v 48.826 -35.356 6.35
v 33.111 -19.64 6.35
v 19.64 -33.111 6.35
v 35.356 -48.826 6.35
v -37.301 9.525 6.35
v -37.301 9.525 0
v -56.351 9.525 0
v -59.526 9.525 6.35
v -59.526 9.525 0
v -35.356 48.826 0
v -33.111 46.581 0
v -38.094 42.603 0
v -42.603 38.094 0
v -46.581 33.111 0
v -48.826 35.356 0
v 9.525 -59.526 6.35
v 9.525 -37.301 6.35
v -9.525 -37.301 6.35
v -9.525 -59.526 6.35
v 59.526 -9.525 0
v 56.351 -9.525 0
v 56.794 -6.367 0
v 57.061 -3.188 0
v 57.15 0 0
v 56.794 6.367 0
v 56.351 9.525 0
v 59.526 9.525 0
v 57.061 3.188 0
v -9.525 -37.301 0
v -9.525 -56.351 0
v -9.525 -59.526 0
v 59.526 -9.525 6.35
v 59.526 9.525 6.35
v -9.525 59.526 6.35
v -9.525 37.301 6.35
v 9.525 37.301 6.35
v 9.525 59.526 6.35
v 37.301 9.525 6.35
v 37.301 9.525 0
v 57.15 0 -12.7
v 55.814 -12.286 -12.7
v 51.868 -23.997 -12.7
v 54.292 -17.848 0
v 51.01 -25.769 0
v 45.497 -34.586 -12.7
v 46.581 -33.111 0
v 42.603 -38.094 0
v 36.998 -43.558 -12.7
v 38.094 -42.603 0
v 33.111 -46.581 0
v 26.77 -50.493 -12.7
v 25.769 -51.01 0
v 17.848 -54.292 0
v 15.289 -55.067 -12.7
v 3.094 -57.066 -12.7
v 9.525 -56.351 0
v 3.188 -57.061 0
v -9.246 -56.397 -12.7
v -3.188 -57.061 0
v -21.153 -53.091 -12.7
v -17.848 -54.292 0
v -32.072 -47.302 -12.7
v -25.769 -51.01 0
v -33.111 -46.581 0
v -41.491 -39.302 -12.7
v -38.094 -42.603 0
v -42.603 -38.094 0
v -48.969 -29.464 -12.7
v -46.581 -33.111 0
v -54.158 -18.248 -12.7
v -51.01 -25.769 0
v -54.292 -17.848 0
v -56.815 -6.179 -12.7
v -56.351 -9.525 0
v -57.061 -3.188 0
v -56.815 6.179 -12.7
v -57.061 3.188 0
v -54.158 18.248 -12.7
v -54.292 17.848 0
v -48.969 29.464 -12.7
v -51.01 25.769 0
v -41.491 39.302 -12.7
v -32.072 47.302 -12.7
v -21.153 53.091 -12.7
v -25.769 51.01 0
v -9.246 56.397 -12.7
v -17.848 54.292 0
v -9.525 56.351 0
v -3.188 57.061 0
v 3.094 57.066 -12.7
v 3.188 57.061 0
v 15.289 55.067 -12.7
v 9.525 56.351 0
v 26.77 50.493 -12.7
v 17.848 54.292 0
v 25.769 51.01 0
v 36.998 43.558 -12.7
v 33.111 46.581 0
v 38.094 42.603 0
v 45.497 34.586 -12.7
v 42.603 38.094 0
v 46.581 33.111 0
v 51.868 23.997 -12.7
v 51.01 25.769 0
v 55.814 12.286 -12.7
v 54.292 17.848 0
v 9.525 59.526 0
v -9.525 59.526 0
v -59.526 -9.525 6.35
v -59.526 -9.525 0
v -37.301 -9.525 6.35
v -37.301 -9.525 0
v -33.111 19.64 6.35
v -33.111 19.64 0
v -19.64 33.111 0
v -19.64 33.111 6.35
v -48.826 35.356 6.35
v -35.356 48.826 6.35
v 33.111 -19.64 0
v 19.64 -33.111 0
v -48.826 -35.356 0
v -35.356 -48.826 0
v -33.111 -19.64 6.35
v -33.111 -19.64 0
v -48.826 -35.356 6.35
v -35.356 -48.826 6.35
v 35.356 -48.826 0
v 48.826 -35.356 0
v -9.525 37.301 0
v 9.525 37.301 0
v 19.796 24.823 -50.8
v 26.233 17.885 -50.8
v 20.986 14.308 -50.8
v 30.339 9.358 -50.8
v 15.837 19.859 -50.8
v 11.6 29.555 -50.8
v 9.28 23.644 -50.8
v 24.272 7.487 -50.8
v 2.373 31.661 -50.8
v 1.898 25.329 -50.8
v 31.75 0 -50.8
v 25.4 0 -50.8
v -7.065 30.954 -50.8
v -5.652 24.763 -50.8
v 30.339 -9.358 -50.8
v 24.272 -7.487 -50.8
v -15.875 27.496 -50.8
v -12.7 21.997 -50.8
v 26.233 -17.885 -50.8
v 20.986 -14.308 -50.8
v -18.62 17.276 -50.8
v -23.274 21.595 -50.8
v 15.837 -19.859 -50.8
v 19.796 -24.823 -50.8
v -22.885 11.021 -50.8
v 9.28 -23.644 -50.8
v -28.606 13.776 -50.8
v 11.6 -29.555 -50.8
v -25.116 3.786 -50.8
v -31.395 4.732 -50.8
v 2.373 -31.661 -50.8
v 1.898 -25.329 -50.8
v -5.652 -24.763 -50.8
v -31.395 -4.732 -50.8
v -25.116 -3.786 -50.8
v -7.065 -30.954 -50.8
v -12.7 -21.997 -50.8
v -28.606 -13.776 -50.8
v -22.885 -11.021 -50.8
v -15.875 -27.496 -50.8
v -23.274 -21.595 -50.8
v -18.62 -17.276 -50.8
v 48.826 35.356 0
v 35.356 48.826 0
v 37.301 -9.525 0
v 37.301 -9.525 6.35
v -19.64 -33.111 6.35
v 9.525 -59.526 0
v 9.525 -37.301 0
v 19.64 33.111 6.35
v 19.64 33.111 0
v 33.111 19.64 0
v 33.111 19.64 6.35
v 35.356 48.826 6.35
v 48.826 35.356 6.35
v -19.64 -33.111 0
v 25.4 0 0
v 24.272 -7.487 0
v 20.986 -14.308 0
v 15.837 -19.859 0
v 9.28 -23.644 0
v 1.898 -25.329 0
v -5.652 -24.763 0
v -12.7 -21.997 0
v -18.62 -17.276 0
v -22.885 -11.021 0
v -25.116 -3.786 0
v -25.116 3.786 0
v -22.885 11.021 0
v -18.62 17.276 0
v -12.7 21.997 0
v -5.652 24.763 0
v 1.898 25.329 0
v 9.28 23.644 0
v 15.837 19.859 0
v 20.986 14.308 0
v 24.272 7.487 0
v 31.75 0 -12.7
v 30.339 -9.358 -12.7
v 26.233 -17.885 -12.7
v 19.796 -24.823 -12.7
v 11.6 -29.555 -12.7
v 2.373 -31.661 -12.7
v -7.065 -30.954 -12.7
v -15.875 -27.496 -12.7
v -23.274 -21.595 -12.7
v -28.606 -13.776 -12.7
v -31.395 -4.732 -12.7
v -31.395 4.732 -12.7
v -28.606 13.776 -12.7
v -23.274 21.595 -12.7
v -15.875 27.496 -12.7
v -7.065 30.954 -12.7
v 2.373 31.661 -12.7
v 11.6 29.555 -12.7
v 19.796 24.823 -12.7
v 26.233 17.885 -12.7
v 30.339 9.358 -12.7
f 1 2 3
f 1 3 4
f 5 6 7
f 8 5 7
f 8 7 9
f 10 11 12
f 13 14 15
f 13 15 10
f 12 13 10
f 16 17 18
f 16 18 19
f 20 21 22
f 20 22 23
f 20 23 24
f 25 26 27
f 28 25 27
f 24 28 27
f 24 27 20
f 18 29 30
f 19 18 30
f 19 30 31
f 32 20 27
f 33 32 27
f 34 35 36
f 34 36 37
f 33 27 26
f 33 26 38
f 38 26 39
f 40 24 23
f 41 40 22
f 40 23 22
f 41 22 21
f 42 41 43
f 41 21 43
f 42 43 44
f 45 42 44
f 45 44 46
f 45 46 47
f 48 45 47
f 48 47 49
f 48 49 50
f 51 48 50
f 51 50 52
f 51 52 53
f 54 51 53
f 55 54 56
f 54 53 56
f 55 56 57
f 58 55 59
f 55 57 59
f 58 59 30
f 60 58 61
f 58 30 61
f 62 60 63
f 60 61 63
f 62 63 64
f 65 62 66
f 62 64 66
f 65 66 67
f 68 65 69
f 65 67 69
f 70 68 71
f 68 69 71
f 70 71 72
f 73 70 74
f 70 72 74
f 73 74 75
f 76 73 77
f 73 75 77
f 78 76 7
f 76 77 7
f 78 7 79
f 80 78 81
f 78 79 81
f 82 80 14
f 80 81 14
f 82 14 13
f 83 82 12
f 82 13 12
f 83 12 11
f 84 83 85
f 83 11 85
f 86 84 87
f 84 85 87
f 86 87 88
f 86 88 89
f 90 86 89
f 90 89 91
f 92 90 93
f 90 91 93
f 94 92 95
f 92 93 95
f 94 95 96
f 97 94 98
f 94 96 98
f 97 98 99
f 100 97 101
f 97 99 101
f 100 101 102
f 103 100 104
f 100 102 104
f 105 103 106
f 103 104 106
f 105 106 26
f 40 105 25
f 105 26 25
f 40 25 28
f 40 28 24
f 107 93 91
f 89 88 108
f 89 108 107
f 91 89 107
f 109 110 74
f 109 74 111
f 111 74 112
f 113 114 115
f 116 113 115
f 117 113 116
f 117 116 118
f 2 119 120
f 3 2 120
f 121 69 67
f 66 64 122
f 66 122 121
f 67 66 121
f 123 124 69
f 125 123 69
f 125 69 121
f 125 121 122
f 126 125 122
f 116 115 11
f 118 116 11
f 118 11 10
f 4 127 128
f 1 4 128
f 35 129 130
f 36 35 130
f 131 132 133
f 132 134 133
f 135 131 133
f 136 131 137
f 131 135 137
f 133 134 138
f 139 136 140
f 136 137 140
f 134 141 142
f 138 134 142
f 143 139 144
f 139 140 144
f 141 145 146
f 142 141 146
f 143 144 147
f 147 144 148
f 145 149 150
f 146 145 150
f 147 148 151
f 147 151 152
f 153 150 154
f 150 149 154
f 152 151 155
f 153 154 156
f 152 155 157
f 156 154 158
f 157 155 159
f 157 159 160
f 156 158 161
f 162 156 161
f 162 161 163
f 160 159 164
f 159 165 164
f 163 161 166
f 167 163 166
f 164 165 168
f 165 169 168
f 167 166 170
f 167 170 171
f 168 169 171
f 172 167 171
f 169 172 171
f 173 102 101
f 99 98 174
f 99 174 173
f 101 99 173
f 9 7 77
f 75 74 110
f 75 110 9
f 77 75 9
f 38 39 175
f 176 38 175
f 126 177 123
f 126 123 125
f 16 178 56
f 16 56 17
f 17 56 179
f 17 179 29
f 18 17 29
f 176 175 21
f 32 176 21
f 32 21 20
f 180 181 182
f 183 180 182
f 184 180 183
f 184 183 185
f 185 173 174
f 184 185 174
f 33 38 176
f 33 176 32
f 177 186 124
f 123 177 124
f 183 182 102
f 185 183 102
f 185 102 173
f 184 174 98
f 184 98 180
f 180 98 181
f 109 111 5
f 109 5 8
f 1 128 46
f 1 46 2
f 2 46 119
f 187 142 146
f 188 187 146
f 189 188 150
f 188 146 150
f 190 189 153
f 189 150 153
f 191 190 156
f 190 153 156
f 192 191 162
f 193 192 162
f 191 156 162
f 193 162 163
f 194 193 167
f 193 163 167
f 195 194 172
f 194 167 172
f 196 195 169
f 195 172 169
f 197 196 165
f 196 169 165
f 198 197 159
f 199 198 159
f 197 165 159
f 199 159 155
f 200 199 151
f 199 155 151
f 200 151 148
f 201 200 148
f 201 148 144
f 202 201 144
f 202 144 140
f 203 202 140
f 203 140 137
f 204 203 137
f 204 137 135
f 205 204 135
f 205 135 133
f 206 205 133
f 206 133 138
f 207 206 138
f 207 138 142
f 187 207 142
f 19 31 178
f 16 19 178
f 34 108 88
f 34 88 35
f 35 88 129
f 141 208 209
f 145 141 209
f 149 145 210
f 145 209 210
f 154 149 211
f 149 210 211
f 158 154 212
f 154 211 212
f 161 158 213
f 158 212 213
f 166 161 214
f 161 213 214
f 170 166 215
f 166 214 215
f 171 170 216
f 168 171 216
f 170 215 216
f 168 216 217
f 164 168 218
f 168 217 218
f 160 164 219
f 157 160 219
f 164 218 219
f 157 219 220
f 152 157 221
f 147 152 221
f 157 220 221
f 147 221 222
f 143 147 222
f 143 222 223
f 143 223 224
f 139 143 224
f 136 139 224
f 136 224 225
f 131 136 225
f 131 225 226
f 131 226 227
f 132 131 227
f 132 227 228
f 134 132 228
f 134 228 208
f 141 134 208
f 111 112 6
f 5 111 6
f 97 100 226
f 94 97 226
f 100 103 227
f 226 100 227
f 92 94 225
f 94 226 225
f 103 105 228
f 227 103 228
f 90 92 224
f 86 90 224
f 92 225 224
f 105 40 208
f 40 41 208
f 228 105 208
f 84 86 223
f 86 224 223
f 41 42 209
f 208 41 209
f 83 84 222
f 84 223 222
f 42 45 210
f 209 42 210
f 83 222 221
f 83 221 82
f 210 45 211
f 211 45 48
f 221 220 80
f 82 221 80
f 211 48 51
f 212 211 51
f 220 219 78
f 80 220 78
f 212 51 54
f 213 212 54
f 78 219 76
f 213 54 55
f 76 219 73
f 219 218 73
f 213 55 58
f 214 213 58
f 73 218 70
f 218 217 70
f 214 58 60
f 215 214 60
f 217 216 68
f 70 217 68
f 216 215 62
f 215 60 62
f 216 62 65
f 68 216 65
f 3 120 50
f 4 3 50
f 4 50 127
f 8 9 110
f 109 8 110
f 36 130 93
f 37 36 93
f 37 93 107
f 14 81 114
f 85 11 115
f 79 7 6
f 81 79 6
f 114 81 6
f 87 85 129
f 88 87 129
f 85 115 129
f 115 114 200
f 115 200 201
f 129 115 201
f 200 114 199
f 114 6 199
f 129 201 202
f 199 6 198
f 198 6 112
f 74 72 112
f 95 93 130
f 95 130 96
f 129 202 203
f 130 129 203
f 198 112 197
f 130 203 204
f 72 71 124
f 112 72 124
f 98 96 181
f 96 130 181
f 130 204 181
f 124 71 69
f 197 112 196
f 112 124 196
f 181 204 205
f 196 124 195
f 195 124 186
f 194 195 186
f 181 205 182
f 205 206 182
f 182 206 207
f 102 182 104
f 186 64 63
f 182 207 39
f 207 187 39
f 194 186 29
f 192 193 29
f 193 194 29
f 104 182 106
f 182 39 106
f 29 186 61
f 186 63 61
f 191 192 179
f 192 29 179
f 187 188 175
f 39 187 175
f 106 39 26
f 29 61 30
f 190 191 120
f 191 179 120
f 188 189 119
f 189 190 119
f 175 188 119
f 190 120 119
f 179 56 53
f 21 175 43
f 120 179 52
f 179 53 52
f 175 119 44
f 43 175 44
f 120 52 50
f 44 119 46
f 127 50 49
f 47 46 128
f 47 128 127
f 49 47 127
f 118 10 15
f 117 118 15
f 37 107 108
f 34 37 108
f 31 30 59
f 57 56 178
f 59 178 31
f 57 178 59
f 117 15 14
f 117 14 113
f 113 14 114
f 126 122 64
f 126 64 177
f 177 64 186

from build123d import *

# Parameters (mm, degrees)
F4_DEPTH = 6.35
F5_COUNT = 8


# Not quite as in the source:
# - a feature names something its author has since deleted; it is built from what else it names


with BuildPart() as f1:
    # F0 (on Front) → F1 (revolve)
    with BuildSketch(Plane.XZ):
        Polygon((25.4, 0), (25.4, -50.8), (31.75, -50.8), (31.75, -12.7), (57.15, -12.7), (57.15, 0), align=None)
    revolve(axis=Axis((0, 0, 2.673143521), (0, 0, -1)))

    # F2 (on face) → F4 (join)
    with BuildSketch(Plane.XY):
        with BuildLine():
            ThreePointArc((57.15, 0), (56.9498143774, -4.779240775), (56.350659934, -9.525))
            Line((56.350659934, -9.525), (59.525659934, -9.525))
            Line((59.525659934, -9.525), (59.525659934, 9.525))
            Line((59.525659934, 9.525), (56.350659934, 9.525))
            ThreePointArc((56.350659934, 9.525), (56.9498143774, 4.779240775), (57.15, 0))
        make_face()
        with BuildLine():
            Line((37.300659934, 9.525), (37.300659934, -9.525))
            Line((37.300659934, -9.525), (56.350659934, -9.525))
            ThreePointArc((56.350659934, -9.525), (56.9498143774, -4.779240775), (57.15, 0))
            ThreePointArc((57.15, 0), (56.9498143774, 4.779240775), (56.350659934, 9.525))
            Line((56.350659934, 9.525), (37.300659934, 9.525))
        make_face()
    extrude(amount=F4_DEPTH)

    # F5: F1 ×8 about axis
    f5_axis = Axis((0, 0, 22.2758), (0, 0, 1))


with BuildPart() as f1_1:
    add(f1.part)
    for i in range(1, F5_COUNT):
        add(f1.part.rotate(f5_axis, i * 360 / F5_COUNT))


solid = f1_1.part
